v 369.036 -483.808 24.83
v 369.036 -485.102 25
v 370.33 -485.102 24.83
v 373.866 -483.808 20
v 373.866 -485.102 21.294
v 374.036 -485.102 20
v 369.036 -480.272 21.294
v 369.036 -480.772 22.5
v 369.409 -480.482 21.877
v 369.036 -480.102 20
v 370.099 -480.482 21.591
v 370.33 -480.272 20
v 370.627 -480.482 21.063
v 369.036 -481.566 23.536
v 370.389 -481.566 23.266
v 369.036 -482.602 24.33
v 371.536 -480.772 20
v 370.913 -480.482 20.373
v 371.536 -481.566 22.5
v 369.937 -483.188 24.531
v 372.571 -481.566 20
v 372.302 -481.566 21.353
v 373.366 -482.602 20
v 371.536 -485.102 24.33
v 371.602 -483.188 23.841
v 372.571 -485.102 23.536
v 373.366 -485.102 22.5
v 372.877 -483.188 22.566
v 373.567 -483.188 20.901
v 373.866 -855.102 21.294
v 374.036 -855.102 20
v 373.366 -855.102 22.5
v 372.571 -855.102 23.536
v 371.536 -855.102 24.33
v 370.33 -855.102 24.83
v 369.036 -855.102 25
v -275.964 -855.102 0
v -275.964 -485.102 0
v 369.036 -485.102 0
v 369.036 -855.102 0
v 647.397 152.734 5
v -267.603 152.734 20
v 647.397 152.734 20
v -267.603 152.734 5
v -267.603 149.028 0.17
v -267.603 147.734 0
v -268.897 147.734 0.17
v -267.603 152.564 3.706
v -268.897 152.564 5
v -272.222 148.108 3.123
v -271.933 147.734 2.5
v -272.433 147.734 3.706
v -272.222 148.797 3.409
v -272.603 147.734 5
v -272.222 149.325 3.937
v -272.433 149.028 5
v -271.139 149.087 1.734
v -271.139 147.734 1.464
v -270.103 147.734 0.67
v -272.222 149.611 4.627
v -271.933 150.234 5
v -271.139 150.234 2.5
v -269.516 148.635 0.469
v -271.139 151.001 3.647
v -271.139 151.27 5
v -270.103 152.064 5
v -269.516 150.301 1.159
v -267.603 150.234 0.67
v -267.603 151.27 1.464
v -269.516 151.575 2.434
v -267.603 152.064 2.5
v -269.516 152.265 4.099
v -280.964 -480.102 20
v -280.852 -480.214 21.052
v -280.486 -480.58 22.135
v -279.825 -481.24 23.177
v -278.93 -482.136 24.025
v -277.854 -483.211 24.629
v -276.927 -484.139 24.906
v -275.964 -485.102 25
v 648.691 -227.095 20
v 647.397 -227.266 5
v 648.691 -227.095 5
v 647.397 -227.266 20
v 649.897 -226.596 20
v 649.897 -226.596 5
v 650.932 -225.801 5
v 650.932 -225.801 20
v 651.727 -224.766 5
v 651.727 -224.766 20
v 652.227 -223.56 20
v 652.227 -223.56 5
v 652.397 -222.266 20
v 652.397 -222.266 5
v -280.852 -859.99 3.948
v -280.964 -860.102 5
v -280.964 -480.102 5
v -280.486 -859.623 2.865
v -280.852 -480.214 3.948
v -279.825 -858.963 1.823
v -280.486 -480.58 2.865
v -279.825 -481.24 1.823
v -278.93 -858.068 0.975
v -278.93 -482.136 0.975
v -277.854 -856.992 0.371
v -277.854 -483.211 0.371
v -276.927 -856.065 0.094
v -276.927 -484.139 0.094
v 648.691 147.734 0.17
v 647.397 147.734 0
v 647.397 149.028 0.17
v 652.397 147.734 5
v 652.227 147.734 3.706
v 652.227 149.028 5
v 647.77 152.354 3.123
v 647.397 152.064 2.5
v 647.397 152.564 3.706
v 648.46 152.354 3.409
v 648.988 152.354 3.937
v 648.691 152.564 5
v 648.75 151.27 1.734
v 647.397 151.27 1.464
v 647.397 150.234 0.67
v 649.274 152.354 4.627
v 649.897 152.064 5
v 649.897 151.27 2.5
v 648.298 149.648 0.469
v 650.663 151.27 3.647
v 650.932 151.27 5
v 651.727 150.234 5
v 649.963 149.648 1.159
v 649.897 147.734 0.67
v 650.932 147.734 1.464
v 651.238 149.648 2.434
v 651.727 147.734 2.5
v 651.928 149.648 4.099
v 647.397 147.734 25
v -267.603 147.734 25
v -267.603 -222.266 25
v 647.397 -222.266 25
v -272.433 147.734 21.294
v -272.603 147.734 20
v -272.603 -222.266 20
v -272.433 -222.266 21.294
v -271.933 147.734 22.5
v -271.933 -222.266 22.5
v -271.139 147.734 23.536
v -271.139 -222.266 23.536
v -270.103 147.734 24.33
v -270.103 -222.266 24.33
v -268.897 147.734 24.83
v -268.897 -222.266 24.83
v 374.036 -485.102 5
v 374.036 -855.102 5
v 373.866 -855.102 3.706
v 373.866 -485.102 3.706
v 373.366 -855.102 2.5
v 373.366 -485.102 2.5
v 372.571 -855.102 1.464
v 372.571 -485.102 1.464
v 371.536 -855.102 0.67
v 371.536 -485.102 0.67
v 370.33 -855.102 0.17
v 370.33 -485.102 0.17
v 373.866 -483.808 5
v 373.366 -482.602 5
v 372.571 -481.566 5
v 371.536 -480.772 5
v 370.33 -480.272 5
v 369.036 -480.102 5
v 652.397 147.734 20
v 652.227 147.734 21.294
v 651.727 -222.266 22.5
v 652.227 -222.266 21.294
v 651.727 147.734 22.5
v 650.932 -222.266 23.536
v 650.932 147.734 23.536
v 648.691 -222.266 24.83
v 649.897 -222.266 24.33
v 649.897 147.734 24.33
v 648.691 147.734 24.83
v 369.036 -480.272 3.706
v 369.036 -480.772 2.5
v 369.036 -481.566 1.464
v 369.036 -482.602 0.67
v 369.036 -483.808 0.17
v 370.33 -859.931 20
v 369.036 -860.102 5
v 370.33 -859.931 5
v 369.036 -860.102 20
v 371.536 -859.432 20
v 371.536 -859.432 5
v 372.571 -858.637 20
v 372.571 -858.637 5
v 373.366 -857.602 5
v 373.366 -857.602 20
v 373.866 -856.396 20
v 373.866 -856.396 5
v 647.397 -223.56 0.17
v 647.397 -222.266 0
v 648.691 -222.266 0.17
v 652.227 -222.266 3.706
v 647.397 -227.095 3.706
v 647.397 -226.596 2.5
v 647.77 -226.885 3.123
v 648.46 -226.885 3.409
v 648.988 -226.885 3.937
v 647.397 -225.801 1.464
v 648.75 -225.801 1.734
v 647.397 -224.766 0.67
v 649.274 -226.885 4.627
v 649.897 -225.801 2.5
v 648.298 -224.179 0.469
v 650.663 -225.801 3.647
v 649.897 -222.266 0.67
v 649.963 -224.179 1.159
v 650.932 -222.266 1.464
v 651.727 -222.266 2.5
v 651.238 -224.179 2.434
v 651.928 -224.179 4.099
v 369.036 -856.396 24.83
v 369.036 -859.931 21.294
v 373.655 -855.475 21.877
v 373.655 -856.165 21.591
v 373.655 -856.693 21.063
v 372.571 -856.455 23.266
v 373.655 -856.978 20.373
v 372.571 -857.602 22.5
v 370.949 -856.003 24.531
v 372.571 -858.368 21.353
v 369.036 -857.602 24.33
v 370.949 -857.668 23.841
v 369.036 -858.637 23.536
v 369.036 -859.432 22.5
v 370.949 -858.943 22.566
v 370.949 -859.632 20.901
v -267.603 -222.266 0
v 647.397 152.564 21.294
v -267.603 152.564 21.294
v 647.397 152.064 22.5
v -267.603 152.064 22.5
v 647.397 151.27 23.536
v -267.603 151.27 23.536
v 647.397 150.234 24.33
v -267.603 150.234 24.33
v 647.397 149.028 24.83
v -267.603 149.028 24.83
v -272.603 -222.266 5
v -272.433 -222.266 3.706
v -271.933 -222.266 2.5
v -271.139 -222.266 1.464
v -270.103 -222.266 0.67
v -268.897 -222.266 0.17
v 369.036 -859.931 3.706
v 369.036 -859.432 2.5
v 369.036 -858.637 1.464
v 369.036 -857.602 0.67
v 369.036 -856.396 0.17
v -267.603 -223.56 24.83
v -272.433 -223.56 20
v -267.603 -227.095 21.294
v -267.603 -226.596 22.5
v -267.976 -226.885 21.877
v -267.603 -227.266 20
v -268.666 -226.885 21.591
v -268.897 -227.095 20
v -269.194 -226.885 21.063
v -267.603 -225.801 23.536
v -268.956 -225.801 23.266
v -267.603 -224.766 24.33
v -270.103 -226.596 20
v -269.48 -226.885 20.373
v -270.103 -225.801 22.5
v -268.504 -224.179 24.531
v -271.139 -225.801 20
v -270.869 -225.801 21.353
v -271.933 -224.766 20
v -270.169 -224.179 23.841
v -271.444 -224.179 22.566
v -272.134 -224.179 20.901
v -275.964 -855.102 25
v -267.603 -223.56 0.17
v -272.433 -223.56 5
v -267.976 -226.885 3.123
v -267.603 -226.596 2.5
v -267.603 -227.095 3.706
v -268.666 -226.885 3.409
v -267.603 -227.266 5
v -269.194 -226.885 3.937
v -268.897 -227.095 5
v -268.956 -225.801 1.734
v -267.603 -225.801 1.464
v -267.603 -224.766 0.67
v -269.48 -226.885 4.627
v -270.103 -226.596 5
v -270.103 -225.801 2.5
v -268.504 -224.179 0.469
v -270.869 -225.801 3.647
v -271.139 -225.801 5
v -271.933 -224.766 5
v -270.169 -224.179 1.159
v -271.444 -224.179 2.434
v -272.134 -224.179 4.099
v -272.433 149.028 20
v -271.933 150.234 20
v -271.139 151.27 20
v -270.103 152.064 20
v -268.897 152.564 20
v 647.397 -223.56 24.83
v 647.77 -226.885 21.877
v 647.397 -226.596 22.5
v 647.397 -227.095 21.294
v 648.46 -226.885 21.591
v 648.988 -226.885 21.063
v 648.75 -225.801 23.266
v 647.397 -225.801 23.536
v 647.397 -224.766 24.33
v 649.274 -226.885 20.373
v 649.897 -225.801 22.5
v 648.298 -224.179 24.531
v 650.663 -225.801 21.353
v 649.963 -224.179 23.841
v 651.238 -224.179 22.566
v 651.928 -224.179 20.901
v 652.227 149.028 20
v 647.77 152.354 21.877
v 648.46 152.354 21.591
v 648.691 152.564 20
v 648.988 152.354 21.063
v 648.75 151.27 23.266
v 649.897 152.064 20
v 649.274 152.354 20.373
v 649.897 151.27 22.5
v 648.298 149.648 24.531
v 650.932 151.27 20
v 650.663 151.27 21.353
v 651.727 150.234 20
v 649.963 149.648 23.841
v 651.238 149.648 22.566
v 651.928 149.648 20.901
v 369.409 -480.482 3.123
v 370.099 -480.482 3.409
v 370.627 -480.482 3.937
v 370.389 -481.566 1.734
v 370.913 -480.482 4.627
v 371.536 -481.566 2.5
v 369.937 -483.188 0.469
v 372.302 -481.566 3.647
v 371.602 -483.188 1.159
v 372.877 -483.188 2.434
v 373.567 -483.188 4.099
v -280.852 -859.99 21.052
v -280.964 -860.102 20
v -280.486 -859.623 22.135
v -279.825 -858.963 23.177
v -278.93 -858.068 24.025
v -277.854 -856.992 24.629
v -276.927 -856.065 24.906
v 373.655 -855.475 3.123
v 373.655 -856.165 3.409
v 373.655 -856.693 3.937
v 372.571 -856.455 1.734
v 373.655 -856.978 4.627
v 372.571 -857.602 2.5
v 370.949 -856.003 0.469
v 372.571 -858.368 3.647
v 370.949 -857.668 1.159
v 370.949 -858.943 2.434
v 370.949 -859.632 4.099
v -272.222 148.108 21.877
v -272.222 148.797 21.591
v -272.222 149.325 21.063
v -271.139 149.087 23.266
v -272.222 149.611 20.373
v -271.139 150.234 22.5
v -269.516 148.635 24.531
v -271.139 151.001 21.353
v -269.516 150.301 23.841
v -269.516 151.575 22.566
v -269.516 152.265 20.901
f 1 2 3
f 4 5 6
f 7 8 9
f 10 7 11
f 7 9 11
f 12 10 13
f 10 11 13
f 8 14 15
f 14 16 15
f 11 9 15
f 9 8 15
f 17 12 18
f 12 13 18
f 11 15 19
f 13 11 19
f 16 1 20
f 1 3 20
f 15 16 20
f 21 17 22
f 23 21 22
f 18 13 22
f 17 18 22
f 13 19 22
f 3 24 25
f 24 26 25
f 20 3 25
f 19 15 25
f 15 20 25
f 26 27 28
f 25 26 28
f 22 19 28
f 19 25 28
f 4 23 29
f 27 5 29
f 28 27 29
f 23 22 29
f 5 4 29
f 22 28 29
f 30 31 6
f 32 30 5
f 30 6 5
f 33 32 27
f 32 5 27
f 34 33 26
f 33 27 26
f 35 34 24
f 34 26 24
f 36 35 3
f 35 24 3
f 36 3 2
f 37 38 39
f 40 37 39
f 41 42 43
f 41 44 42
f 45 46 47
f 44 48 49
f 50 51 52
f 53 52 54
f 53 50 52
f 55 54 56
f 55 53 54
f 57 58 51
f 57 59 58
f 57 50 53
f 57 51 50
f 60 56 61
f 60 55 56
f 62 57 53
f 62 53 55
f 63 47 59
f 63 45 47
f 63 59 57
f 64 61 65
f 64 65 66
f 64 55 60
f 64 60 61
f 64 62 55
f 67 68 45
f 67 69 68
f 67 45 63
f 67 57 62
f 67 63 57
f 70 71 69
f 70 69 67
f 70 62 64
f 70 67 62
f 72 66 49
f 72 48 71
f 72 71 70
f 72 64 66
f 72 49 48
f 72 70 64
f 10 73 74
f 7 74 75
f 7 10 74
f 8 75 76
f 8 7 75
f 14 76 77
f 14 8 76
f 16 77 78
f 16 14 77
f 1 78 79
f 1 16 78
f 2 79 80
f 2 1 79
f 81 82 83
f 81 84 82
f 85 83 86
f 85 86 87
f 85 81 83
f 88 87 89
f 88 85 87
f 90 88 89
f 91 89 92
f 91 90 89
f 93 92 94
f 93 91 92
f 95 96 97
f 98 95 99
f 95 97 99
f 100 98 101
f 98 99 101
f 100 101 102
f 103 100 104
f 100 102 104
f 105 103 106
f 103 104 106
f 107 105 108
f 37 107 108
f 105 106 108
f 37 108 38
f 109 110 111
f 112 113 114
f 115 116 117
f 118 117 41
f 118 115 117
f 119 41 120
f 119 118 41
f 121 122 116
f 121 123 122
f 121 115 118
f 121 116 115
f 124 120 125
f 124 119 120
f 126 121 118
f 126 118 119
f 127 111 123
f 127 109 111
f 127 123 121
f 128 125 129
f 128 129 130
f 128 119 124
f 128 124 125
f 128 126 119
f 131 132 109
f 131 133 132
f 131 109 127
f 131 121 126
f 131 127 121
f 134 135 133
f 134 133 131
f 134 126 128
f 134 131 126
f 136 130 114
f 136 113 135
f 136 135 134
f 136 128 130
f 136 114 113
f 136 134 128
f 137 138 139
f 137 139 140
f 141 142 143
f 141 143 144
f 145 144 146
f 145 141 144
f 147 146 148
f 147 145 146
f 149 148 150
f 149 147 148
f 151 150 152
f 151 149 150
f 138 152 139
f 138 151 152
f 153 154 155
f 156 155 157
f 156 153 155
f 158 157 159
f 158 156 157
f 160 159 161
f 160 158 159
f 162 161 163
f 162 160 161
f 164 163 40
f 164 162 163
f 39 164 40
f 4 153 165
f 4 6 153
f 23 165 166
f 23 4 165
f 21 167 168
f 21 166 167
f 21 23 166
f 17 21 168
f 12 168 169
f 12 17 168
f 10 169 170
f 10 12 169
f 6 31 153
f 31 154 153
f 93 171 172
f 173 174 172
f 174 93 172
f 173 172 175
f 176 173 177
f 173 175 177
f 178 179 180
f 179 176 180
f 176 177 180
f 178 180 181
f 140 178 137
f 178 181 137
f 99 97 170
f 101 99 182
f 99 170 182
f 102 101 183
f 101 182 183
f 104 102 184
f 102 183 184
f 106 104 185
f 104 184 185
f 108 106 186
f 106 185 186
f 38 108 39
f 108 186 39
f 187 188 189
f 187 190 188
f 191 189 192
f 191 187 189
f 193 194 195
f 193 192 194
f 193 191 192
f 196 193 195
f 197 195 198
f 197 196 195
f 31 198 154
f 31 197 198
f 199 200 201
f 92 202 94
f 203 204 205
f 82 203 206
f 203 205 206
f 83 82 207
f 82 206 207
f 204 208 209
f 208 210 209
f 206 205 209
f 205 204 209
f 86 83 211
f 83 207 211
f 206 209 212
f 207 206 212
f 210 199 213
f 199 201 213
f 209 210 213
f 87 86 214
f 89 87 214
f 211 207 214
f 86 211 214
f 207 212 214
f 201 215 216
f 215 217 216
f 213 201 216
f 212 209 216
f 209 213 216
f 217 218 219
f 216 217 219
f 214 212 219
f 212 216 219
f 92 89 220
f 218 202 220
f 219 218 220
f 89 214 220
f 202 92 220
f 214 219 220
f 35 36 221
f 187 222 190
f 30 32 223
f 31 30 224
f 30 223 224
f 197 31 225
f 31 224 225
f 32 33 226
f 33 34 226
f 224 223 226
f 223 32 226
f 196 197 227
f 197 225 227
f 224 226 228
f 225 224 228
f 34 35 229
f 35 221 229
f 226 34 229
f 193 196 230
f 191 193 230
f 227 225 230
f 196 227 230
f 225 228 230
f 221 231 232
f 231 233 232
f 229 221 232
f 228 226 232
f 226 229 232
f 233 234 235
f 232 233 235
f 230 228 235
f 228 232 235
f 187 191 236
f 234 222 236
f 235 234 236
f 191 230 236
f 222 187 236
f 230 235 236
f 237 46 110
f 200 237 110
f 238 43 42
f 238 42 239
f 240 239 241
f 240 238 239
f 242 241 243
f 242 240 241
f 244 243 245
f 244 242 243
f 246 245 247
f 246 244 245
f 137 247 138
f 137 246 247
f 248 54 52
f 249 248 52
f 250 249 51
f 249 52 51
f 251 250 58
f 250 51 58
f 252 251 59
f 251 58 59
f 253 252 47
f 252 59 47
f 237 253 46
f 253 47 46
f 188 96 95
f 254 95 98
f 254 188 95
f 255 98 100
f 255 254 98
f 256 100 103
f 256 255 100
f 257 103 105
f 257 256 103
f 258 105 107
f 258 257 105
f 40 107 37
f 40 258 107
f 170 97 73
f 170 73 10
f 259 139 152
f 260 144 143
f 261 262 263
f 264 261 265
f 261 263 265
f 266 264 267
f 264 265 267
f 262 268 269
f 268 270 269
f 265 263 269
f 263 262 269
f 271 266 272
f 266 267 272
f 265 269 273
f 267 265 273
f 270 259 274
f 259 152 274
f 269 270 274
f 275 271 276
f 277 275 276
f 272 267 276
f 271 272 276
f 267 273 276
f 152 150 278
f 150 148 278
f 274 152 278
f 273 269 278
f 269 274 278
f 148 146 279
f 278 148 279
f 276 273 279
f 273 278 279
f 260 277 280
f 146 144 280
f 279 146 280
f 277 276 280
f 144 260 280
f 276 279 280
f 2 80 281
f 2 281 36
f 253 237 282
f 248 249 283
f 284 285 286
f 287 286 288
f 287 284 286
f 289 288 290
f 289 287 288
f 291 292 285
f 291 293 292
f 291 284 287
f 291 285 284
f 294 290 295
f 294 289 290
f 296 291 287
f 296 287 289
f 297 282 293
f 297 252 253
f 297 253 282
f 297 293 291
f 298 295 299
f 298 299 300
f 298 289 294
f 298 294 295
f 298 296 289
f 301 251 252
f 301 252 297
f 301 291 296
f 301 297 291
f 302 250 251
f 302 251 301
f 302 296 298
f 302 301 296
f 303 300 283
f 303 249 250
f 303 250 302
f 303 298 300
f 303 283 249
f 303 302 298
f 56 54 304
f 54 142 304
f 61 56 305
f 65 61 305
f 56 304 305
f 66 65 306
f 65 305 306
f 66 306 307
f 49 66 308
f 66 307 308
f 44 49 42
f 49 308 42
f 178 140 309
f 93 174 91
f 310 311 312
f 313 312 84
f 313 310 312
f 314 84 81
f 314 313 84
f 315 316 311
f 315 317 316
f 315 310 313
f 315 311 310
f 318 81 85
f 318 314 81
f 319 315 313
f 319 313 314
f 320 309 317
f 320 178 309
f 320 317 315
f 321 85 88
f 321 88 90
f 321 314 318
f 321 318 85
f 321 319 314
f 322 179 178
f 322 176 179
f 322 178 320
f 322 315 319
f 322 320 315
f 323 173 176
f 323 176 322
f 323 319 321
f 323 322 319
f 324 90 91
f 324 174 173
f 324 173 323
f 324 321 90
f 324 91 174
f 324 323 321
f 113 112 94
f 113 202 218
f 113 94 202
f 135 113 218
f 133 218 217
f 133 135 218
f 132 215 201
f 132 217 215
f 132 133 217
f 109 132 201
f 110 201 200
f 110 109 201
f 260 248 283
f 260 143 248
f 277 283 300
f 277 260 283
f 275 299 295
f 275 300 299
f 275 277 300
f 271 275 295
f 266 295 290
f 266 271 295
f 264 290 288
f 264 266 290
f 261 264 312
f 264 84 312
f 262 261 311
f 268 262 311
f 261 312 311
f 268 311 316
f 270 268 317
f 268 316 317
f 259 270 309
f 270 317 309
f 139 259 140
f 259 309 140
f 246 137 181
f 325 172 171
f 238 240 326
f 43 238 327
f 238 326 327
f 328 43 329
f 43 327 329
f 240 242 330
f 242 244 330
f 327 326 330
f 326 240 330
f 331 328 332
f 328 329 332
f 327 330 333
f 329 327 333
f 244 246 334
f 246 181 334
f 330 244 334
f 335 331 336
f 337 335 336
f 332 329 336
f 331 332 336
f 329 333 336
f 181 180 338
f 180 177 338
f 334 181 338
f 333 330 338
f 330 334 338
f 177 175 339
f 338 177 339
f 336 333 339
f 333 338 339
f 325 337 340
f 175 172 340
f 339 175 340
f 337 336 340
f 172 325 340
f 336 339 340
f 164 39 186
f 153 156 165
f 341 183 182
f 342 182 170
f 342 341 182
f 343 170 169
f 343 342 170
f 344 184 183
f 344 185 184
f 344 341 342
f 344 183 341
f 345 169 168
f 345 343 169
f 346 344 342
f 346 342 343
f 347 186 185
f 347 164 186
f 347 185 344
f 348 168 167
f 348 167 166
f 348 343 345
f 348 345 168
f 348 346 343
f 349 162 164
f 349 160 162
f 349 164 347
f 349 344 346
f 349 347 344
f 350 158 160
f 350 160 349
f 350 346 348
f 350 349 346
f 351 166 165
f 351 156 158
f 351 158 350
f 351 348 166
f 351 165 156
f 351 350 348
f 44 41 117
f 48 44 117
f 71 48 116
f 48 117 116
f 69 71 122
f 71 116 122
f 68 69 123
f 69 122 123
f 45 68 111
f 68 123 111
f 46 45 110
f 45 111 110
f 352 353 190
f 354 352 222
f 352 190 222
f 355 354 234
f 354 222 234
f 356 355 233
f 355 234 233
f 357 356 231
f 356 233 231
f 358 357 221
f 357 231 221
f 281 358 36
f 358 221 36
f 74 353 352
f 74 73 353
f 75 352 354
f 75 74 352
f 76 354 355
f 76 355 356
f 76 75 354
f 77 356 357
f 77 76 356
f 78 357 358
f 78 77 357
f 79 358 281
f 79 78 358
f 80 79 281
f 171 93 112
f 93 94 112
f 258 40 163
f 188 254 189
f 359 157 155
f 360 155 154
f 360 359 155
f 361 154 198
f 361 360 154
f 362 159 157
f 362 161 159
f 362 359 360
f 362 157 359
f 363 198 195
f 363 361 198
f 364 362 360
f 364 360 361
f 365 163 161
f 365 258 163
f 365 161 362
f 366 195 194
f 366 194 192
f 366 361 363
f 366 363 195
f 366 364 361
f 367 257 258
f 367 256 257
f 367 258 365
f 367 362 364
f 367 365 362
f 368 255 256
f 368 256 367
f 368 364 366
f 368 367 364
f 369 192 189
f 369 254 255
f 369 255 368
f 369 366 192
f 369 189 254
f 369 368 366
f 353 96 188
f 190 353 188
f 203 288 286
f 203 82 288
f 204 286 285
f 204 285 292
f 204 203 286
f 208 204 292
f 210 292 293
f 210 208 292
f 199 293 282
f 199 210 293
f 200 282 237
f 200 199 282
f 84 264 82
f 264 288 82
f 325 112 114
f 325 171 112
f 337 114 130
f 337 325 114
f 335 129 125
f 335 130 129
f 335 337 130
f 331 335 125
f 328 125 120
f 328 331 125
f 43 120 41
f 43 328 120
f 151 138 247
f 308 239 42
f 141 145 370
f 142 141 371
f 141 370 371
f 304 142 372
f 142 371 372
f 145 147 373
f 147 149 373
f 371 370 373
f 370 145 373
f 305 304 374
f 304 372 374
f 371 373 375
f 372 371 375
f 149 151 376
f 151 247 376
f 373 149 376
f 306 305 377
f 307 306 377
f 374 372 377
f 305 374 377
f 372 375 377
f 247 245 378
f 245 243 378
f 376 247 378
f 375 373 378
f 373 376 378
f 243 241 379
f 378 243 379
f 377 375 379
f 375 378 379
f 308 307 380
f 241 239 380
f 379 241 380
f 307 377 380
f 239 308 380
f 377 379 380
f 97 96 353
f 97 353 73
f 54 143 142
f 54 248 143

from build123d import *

# Parameters (mm, degrees)
F0_W     = 655
F0_H     = 380
F1_DEPTH = 25
F3_DEPTH = 380.001
F4_R     = 5
F5_W     = 925
F5_H     = 380
F6_DEPTH = 25
F7_R     = 5


with BuildPart() as f1:
    # F0 (on Top) → F1 (new body)
    with BuildSketch(Plane.XY):
        with Locations((46.5359067917, -670.1017089717)):
            Rectangle(F0_W, F0_H)
    extrude(amount=F1_DEPTH)

    # F2 (on face) → F3 (cut, through all)
    with BuildSketch(Plane.XZ.offset(860.1017089717)):
        Polygon((-329.5351266861, 5.0213485956), (-321.2029933929, 5.0213038921), (-293.8260436058, 27.9015563428), (-329.5351266861, 27.9015563428), align=None)
    extrude(amount=-F3_DEPTH, mode=Mode.SUBTRACT)

    # F4
    f4_edges = [f1.edges().sort_by_distance(p)[0] for p in [
        (-280.964093, -670.101709, 25),
        (46.535907, -860.101709, 25),
        (374.035907, -670.101709, 25),
        (46.535907, -480.101709, 25),
        (-280.964093, -670.101709, 0),
        (46.535907, -860.101709, 0),
        (374.035907, -670.101709, 0),
        (46.535907, -480.101709, 0),
        (374.035907, -860.101709, 12.5),
        (374.035907, -480.101709, 12.5),
    ]]
    fillet(f4_edges, radius=F4_R)


with BuildPart() as f6:
    # F5 (on Top) → F6 (new body)
    with BuildSketch(Plane.XY):
        with Locations((189.8969432941, -37.2657254338)):
            Rectangle(F5_W, F5_H)
    extrude(amount=F6_DEPTH)

    # F7
    f7_edges = [f6.edges().sort_by_distance(p)[0] for p in [
        (652.396943, -37.265725, 25),
        (189.896943, 152.734275, 25),
        (-272.603057, -37.265725, 25),
        (189.896943, -227.265725, 25),
        (652.396943, -37.265725, 0),
        (189.896943, 152.734275, 0),
        (-272.603057, -37.265725, 0),
        (189.896943, -227.265725, 0),
        (652.396943, 152.734275, 12.5),
        (-272.603057, 152.734275, 12.5),
        (-272.603057, -227.265725, 12.5),
        (652.396943, -227.265725, 12.5),
    ]]
    fillet(f7_edges, radius=F7_R)


solid = Compound([f1.part, f6.part])
